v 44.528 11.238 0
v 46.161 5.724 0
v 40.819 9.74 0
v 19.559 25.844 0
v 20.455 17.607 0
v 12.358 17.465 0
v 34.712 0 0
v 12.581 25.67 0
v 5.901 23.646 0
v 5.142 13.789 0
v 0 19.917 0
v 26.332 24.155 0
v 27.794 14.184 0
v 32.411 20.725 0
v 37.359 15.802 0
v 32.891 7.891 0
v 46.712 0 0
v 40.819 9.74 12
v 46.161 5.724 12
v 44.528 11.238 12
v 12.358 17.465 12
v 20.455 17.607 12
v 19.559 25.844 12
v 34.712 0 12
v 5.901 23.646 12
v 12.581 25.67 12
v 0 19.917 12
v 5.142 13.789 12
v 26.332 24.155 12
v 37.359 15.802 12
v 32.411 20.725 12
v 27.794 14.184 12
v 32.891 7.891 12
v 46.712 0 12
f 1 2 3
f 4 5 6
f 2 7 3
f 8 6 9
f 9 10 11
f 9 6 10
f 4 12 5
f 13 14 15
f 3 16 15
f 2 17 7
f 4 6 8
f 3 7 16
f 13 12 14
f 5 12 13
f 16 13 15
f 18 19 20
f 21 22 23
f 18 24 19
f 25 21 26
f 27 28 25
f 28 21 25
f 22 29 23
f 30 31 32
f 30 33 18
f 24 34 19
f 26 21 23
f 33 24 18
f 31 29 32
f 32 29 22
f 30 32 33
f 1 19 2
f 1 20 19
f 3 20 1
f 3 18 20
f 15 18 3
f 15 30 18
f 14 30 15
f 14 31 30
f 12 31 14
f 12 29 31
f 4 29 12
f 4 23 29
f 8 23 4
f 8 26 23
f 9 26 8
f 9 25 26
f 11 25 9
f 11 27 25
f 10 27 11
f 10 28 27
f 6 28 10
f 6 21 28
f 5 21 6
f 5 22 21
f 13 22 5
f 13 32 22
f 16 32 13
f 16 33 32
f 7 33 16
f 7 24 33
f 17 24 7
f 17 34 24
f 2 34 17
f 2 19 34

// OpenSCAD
$fn = 32;

// ----------------------------------------------------------------------
// Arc stop: segment, 12 mm thick
// ----------------------------------------------------------------------

// --- parameters (mm) ---
profile_height = 12;      // extrusion height
profile_points = 17;      // points of the closed outline

profile = [[46.712, 0], [46.161, 5.724], [44.528, 11.238], [40.819, 9.74], [37.359, 15.802], [32.411, 20.725], [26.332, 24.155], [19.559, 25.844], [12.581, 25.67], [5.901, 23.646], [0, 19.917], [5.142, 13.789], [12.358, 17.465], [20.455, 17.607], [27.794, 14.184], [32.891, 7.891], [34.712, 0]];  // single closed polygon, 17 points, counter clockwise

// --- the one profile operation ---
linear_extrude(height = profile_height) polygon(points = profile);
